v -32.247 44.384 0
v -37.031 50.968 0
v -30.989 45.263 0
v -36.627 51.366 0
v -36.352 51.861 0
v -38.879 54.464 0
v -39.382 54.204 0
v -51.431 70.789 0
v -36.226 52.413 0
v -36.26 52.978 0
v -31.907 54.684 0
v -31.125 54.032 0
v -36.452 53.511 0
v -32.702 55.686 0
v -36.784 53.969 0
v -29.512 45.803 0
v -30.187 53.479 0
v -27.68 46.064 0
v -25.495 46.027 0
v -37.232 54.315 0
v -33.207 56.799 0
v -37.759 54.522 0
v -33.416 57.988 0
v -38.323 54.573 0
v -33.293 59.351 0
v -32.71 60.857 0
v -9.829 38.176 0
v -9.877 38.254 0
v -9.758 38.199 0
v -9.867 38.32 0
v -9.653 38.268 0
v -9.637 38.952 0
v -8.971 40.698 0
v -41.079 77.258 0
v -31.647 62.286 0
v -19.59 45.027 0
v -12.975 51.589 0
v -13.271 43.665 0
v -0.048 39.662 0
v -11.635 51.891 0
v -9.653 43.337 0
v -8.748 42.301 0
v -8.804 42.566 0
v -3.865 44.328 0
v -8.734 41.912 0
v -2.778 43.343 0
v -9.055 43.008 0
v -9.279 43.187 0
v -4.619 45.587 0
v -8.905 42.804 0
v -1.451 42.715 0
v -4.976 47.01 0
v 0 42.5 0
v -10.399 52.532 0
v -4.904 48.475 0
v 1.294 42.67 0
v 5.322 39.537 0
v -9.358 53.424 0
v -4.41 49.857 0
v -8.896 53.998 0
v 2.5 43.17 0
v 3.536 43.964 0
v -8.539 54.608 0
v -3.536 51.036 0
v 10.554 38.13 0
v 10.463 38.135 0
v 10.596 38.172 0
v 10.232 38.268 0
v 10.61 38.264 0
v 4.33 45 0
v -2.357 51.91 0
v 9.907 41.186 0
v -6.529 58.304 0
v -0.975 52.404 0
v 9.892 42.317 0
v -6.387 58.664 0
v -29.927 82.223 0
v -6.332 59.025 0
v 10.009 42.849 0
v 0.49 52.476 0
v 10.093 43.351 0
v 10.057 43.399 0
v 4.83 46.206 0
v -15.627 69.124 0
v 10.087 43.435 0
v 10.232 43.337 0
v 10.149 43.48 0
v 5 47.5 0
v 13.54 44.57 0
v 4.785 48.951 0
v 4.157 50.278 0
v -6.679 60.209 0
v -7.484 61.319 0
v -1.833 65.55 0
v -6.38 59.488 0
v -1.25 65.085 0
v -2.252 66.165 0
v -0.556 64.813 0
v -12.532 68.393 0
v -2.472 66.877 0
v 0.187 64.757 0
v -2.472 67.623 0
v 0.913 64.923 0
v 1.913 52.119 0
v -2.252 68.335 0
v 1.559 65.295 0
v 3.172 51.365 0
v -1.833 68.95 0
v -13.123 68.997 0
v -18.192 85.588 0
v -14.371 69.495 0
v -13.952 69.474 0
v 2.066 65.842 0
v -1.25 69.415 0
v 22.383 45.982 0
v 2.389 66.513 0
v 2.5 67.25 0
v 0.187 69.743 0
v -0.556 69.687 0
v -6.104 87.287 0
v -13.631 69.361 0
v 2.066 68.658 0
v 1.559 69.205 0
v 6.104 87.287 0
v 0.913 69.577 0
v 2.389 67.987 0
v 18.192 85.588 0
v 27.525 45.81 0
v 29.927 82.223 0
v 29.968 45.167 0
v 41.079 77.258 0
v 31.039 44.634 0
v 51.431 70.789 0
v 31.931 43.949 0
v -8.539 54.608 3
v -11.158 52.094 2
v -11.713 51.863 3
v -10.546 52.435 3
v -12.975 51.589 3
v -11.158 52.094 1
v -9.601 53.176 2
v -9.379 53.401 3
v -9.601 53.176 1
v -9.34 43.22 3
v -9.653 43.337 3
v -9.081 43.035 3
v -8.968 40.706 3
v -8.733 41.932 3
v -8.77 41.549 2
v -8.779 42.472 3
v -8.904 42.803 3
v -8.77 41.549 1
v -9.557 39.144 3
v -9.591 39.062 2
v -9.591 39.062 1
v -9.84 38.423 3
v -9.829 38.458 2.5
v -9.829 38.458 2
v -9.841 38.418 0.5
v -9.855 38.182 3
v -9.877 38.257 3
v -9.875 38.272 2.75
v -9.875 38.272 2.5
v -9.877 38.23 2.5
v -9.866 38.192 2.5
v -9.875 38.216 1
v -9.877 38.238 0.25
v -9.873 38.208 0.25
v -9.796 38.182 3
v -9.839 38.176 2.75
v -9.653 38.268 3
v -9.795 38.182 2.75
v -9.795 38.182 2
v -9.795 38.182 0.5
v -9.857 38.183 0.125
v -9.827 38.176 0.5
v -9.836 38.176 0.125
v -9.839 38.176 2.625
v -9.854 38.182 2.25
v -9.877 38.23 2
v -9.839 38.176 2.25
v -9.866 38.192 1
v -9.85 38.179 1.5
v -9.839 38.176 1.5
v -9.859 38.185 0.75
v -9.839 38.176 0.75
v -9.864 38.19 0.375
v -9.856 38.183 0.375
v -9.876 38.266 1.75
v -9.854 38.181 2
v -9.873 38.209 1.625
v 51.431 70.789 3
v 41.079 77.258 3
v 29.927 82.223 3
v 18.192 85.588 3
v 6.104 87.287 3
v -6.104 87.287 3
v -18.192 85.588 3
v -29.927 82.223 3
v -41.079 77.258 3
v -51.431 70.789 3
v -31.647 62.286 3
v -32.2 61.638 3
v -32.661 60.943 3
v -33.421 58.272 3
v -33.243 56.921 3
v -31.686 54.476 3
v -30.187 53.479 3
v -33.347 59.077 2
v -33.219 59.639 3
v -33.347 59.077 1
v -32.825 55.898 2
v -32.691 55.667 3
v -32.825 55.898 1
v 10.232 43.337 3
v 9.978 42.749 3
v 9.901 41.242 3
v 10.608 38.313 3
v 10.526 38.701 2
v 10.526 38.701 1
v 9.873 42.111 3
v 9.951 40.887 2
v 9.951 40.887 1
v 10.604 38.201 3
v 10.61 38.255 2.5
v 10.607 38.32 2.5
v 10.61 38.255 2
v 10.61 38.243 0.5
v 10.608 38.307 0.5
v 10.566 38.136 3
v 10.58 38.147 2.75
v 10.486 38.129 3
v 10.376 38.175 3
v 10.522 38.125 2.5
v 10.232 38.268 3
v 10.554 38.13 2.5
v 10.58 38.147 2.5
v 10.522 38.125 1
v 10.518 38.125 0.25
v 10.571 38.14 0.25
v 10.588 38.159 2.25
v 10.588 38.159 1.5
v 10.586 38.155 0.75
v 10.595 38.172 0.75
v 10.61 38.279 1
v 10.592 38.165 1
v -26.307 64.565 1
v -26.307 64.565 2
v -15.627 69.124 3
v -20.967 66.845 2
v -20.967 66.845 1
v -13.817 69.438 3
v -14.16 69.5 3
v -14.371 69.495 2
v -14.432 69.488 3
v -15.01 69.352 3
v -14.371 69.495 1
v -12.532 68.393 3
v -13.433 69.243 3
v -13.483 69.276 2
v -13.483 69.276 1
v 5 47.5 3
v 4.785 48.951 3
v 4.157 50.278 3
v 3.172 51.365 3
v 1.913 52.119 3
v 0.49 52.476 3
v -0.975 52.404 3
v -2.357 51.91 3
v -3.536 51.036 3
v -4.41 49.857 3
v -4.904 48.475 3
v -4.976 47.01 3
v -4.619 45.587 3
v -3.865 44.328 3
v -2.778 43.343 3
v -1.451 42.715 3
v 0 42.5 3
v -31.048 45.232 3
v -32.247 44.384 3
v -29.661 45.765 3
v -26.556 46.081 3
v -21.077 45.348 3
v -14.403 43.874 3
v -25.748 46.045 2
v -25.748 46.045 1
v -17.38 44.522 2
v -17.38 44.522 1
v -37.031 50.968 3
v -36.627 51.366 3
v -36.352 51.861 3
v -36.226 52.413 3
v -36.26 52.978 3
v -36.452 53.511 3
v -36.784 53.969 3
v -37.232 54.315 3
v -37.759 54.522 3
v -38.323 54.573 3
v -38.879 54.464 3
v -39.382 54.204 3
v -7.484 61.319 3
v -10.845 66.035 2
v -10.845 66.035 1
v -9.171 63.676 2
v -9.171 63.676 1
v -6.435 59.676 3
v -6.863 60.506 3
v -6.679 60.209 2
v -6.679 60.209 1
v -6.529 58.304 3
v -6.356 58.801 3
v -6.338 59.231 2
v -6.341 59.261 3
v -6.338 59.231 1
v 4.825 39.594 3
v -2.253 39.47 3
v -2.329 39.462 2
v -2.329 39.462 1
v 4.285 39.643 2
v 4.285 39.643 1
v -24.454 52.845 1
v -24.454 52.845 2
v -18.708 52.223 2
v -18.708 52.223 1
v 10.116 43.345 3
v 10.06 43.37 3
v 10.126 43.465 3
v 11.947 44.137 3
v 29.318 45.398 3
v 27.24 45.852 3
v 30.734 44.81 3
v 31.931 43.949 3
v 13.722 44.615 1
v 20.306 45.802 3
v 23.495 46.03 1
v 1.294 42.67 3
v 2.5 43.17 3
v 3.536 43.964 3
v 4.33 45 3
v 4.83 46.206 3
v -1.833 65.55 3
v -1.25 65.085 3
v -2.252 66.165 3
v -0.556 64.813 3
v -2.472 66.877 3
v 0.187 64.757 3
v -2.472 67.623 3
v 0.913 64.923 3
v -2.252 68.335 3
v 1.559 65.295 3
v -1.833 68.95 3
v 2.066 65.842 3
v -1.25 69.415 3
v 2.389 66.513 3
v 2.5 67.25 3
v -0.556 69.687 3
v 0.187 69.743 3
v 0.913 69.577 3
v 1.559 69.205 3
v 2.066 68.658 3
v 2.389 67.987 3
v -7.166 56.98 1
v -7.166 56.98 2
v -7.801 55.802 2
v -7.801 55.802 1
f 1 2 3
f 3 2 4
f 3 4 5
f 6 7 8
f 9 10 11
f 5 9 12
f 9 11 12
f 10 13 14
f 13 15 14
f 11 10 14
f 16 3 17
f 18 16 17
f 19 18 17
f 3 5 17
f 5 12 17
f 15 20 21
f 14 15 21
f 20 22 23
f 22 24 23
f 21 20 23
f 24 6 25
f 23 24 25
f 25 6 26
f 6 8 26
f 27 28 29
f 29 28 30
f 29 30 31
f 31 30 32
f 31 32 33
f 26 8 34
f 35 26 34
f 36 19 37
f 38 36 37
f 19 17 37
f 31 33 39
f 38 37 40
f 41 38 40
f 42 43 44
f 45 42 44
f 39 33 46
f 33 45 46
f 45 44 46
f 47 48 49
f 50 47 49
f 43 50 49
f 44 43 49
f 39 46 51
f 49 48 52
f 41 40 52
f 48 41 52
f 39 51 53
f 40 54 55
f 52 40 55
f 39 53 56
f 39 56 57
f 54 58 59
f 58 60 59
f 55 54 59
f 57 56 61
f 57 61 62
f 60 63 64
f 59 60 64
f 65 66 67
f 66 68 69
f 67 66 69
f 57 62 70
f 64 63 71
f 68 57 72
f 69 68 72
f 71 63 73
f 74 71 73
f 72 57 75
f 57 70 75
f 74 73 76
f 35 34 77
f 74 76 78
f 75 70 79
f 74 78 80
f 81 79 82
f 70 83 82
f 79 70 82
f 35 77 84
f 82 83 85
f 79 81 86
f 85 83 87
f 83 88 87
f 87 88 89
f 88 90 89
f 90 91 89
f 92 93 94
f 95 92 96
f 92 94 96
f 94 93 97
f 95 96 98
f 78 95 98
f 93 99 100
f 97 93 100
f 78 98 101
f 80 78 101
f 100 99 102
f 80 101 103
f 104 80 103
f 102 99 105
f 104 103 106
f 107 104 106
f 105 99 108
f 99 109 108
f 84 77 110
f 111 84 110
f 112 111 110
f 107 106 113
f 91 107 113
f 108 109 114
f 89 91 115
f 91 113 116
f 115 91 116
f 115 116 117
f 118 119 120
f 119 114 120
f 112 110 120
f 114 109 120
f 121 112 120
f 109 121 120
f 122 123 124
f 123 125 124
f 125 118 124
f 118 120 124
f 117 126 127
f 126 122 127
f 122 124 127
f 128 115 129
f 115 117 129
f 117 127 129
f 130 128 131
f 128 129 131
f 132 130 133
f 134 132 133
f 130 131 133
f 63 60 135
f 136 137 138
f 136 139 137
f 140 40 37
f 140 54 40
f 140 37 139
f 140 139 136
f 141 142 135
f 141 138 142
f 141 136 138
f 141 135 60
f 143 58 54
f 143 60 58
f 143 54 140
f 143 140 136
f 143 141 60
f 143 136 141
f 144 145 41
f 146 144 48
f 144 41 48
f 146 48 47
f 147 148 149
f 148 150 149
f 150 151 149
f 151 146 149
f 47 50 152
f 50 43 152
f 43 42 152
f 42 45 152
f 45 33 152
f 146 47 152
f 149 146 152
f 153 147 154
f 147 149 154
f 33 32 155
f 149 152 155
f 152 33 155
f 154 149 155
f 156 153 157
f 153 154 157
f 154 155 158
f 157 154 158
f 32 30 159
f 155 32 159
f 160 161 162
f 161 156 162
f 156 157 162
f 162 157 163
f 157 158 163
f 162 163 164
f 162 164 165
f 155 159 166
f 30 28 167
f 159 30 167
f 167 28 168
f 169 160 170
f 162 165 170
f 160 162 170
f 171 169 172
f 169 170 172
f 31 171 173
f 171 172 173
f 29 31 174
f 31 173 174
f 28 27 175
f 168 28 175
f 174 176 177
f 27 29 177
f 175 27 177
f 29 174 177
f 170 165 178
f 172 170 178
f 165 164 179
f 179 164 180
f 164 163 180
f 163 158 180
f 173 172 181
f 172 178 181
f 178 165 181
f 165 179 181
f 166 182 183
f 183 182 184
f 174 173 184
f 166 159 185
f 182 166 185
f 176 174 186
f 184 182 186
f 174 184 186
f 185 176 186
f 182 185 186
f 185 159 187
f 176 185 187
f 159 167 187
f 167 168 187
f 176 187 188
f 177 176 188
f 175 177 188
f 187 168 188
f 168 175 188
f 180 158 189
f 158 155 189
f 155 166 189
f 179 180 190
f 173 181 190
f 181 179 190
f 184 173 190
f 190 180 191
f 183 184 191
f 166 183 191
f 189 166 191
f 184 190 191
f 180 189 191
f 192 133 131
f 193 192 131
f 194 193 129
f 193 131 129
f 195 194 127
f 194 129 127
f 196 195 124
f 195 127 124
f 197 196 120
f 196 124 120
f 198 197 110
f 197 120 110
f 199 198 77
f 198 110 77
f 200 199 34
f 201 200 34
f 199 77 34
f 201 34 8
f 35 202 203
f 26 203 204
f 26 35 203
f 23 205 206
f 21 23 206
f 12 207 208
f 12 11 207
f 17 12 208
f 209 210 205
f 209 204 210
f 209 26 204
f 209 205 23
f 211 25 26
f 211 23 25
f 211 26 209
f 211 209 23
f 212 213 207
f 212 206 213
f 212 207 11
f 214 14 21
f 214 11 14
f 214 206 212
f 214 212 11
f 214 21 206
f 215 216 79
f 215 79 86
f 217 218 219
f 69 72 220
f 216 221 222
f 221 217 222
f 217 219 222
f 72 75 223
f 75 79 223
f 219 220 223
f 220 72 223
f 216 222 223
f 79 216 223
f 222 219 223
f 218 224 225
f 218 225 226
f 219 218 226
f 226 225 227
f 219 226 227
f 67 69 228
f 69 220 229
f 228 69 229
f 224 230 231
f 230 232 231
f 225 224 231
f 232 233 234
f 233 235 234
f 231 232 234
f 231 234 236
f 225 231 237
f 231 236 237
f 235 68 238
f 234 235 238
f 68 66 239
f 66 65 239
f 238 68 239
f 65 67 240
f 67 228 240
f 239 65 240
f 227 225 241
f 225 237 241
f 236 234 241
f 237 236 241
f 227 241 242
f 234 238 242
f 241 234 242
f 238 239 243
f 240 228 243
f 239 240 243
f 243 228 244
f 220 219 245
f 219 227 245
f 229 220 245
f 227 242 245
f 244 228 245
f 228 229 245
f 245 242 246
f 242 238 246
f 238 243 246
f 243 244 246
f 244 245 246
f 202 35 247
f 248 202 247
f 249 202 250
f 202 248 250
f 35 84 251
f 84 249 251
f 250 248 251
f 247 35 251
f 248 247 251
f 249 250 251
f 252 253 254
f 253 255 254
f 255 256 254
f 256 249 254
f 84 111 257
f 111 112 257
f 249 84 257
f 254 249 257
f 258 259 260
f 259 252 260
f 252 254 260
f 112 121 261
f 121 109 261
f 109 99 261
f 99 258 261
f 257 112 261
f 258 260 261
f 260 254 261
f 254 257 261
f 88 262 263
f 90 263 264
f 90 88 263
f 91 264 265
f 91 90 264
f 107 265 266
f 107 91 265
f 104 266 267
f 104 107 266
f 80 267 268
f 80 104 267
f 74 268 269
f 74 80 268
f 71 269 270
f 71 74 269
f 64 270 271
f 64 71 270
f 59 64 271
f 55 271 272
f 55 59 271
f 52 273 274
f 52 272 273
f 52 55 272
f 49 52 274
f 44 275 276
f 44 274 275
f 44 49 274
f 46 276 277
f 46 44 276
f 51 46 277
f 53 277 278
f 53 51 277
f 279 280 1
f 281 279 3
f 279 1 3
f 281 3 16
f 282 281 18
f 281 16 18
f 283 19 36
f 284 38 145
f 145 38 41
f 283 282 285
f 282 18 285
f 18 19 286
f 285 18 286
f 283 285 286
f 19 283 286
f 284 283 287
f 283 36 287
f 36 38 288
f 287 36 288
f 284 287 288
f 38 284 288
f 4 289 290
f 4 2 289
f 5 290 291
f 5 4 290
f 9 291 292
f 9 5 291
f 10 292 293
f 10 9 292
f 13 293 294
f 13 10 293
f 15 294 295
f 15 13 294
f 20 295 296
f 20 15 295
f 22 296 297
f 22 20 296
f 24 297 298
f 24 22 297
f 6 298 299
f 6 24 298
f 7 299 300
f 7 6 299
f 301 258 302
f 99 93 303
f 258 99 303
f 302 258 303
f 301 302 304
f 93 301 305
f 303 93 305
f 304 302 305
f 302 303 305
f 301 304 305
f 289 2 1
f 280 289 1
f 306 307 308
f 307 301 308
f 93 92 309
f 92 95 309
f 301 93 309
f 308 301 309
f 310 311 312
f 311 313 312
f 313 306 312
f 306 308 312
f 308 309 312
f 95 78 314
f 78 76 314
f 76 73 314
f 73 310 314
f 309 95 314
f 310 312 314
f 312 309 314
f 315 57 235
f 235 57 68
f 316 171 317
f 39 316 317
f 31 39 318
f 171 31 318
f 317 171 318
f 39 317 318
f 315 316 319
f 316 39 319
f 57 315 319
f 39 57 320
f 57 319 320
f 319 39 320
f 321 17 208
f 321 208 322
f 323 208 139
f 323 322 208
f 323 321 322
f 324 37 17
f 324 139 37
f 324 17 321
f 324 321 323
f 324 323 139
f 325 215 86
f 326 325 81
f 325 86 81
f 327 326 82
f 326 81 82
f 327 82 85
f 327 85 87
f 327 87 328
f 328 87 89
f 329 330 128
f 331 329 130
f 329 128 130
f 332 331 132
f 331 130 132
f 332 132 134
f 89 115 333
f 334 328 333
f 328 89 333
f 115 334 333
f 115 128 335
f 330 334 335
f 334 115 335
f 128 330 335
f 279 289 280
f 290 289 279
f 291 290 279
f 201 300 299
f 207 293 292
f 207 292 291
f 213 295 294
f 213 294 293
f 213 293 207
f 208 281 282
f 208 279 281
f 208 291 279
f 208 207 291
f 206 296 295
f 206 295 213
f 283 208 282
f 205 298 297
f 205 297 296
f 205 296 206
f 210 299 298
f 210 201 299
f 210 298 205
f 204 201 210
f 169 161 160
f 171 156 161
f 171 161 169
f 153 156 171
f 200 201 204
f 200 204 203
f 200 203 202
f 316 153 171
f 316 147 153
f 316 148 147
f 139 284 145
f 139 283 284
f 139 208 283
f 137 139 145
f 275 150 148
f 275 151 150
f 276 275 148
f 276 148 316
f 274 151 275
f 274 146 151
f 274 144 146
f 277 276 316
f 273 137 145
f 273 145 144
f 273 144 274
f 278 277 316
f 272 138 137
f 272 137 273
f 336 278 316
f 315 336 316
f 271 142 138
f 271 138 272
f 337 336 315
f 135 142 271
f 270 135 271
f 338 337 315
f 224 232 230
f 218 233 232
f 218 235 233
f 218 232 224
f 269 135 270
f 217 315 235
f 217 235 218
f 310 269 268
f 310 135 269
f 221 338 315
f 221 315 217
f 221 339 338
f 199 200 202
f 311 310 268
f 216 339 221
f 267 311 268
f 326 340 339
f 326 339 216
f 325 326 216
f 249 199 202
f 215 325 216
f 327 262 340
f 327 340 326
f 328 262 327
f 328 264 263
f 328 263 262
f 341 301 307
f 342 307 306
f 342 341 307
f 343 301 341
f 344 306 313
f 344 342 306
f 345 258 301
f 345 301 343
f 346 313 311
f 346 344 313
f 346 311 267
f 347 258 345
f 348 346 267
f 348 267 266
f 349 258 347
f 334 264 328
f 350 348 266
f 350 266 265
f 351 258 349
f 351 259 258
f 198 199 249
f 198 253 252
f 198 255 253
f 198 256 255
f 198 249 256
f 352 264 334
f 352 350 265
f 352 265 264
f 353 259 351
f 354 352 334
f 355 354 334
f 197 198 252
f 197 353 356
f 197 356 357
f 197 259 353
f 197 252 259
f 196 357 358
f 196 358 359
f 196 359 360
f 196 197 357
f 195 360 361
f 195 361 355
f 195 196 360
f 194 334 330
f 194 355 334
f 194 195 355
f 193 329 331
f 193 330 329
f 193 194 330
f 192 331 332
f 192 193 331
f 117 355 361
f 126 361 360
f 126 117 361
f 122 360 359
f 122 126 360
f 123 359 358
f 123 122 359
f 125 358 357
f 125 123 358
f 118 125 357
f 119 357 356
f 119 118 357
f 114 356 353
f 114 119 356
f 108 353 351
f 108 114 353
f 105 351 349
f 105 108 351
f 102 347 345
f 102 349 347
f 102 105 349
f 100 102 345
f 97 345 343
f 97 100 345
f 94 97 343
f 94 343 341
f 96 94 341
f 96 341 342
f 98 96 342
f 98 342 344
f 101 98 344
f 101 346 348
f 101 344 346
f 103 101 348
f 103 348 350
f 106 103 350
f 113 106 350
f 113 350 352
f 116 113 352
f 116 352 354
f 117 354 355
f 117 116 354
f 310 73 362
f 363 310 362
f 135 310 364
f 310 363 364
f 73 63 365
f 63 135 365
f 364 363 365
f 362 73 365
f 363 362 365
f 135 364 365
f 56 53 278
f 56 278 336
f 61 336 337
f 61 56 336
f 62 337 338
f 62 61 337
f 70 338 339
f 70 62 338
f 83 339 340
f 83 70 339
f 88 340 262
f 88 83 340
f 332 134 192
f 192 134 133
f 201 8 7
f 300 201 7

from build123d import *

# Parameters (mm, degrees)
F1_DEPTH  = 3
F2_R      = 2
F3_DEPTH  = 13.4
F5_DEPTH  = 15.1
F7_DEPTH  = 28
F9_DEPTH  = 40.9
F10_R     = 2.5
F11_DEPTH = 30.3
F12_DEPTH = 32.7


with BuildPart() as f1:
    # F0 (on Top) → F1 (new body)
    with BuildSketch(Plane.XY):
        with BuildLine():
            Line((0, 0), (51.43121, 70.788987))
            ThreePointArc((51.43121, 70.788987), (0, 87.5), (-51.43121, 70.788987))
            Line((-51.43121, 70.788987), (0, 0))
        make_face()
    extrude(amount=F1_DEPTH)

    # F2 (on Top) → F3 (cut)
    with BuildSketch(Plane.XY):
        with Locations((-38.219705, 52.576175)):
            Circle(F2_R)
    extrude(amount=F3_DEPTH, mode=Mode.SUBTRACT)

    # F4 (on Top) → F5 (cut)
    with BuildSketch(Plane.XY):
        with BuildLine():
            ThreePointArc((0, 42.5), (3.535534, 43.964466), (5, 47.5))
            ThreePointArc((5, 47.5), (-3.535534, 51.035534), (0, 42.5))
        make_face()
    extrude(amount=F5_DEPTH, mode=Mode.SUBTRACT)

    # F6 (on Top) → F7 (cut)
    with BuildSketch(Plane.XY):
        with BuildLine():
            add(Edge.make_bspline(
                [(-32.372009, 44.262763), (-27.721515, 48.913255), (-16.280954, 43.176574), (-9.652664, 43.336935)],
                knots=[0, 0, 0, 0, 22.738201, 22.738201, 22.738201, 22.738201], degree=3))
            Line((-32.372009, 44.262763), (0, 0))
            Line((0, 0), (32.459896, 43.336935))
            add(Edge.make_bspline(
                [(10.232204, 43.336935), (7.958638, 43.336935), (28.130125, 49.419351), (32.459896, 43.336935)],
                knots=[0, 0, 0, 0, 22.227692, 22.227692, 22.227692, 22.227692], degree=3))
            add(Edge.make_bspline(
                [(10.232204, 38.267672), (11.534555, 37.32701), (8.94931, 41.252229), (10.232204, 43.336935)],
                knots=[0, 0, 0, 0, 5.069263, 5.069263, 5.069263, 5.069263], degree=3))
            add(Edge.make_bspline(
                [(-9.652664, 38.267672), (-1.960609, 39.786551), (4.604817, 40.60315), (10.232204, 38.267672)],
                knots=[0, 0, 0, 0, 19.884868, 19.884868, 19.884868, 19.884868], degree=3))
            add(Edge.make_bspline(
                [(-9.652664, 43.336935), (-7.098308, 42.695489), (-10.790724, 37.418947), (-9.652664, 38.267672)],
                knots=[0, 0, 0, 0, 5.069263, 5.069263, 5.069263, 5.069263], degree=3))
        make_face()
    extrude(amount=F7_DEPTH, mode=Mode.SUBTRACT)

    # F8 (on Top) → F9 (cut)
    with BuildSketch(Plane.XY):
        with BuildLine():
            add(Edge.make_bspline(
                [(-31.646983, 62.285967), (-34.494214, 59.307128), (-33.847807, 55.272655), (-30.18681, 53.478997)],
                knots=[0, 0, 0, 0, 8.927196, 8.927196, 8.927196, 8.927196], degree=3))
            add(Edge.make_bspline(
                [(-30.18681, 53.478997), (-24.470332, 52.831151), (-18.69169, 52.237308), (-12.975213, 51.589462)],
                knots=[0, 0, 0, 0, 17.315005, 17.315005, 17.315005, 17.315005], degree=3))
            add(Edge.make_bspline(
                [(-12.975213, 51.589462), (-11.106356, 51.730501), (-9.275662, 53.076804), (-8.538607, 54.607607)],
                knots=[0, 0, 0, 0, 5.365881, 5.365881, 5.365881, 5.365881], degree=3))
            add(Edge.make_bspline(
                [(-6.528673, 58.304172), (-7.200886, 56.853276), (-7.715667, 55.865123), (-8.538607, 54.607607)],
                knots=[0, 0, 0, 0, 4.207662, 4.207662, 4.207662, 4.207662], degree=3))
            add(Edge.make_bspline(
                [(-7.48369, 61.318793), (-6.469775, 60.11533), (-6.048826, 59.233338), (-6.528673, 58.304172)],
                knots=[0, 0, 0, 0, 3.162278, 3.162278, 3.162278, 3.162278], degree=3))
            add(Edge.make_bspline(
                [(-12.531957, 68.392515), (-10.830528, 66.036878), (-9.185119, 63.67443), (-7.48369, 61.318793)],
                knots=[0, 0, 0, 0, 8.690371, 8.690371, 8.690371, 8.690371], degree=3))
            add(Edge.make_bspline(
                [(-15.627065, 69.123868), (-14.042395, 69.763878), (-13.65924, 69.634747), (-12.531957, 68.392515)],
                knots=[0, 0, 0, 0, 3.180341, 3.180341, 3.180341, 3.180341], degree=3))
            add(Edge.make_bspline(
                [(-31.646983, 62.285967), (-26.30701, 64.565267), (-20.967037, 66.844568), (-15.627065, 69.123868)],
                knots=[0, 0, 0, 0, 17.418228, 17.418228, 17.418228, 17.418228], degree=3))
        make_face()
    extrude(amount=F9_DEPTH, mode=Mode.SUBTRACT)

    # F10 (on Top) → F11 (cut)
    with BuildSketch(Plane.XY):
        with Locations((0, 67.25)):
            Circle(F10_R)
    extrude(amount=F11_DEPTH, mode=Mode.SUBTRACT)

    # F8 (on Top) → F12 (cut)
    with BuildSketch(Plane.XY):
        with BuildLine():
            add(Edge.make_bspline(
                [(-31.646983, 62.285967), (-34.494214, 59.307128), (-33.847807, 55.272655), (-30.18681, 53.478997)],
                knots=[0, 0, 0, 0, 8.927196, 8.927196, 8.927196, 8.927196], degree=3))
            add(Edge.make_bspline(
                [(-30.18681, 53.478997), (-24.470332, 52.831151), (-18.69169, 52.237308), (-12.975213, 51.589462)],
                knots=[0, 0, 0, 0, 17.315005, 17.315005, 17.315005, 17.315005], degree=3))
            add(Edge.make_bspline(
                [(-12.975213, 51.589462), (-11.106356, 51.730501), (-9.275662, 53.076804), (-8.538607, 54.607607)],
                knots=[0, 0, 0, 0, 5.365881, 5.365881, 5.365881, 5.365881], degree=3))
            add(Edge.make_bspline(
                [(-6.528673, 58.304172), (-7.200886, 56.853276), (-7.715667, 55.865123), (-8.538607, 54.607607)],
                knots=[0, 0, 0, 0, 4.207662, 4.207662, 4.207662, 4.207662], degree=3))
            add(Edge.make_bspline(
                [(-7.48369, 61.318793), (-6.469775, 60.11533), (-6.048826, 59.233338), (-6.528673, 58.304172)],
                knots=[0, 0, 0, 0, 3.162278, 3.162278, 3.162278, 3.162278], degree=3))
            add(Edge.make_bspline(
                [(-12.531957, 68.392515), (-10.830528, 66.036878), (-9.185119, 63.67443), (-7.48369, 61.318793)],
                knots=[0, 0, 0, 0, 8.690371, 8.690371, 8.690371, 8.690371], degree=3))
            add(Edge.make_bspline(
                [(-15.627065, 69.123868), (-14.042395, 69.763878), (-13.65924, 69.634747), (-12.531957, 68.392515)],
                knots=[0, 0, 0, 0, 3.180341, 3.180341, 3.180341, 3.180341], degree=3))
            add(Edge.make_bspline(
                [(-31.646983, 62.285967), (-26.30701, 64.565267), (-20.967037, 66.844568), (-15.627065, 69.123868)],
                knots=[0, 0, 0, 0, 17.418228, 17.418228, 17.418228, 17.418228], degree=3))
        make_face()
    extrude(amount=F12_DEPTH, mode=Mode.SUBTRACT)


solid = f1.part
